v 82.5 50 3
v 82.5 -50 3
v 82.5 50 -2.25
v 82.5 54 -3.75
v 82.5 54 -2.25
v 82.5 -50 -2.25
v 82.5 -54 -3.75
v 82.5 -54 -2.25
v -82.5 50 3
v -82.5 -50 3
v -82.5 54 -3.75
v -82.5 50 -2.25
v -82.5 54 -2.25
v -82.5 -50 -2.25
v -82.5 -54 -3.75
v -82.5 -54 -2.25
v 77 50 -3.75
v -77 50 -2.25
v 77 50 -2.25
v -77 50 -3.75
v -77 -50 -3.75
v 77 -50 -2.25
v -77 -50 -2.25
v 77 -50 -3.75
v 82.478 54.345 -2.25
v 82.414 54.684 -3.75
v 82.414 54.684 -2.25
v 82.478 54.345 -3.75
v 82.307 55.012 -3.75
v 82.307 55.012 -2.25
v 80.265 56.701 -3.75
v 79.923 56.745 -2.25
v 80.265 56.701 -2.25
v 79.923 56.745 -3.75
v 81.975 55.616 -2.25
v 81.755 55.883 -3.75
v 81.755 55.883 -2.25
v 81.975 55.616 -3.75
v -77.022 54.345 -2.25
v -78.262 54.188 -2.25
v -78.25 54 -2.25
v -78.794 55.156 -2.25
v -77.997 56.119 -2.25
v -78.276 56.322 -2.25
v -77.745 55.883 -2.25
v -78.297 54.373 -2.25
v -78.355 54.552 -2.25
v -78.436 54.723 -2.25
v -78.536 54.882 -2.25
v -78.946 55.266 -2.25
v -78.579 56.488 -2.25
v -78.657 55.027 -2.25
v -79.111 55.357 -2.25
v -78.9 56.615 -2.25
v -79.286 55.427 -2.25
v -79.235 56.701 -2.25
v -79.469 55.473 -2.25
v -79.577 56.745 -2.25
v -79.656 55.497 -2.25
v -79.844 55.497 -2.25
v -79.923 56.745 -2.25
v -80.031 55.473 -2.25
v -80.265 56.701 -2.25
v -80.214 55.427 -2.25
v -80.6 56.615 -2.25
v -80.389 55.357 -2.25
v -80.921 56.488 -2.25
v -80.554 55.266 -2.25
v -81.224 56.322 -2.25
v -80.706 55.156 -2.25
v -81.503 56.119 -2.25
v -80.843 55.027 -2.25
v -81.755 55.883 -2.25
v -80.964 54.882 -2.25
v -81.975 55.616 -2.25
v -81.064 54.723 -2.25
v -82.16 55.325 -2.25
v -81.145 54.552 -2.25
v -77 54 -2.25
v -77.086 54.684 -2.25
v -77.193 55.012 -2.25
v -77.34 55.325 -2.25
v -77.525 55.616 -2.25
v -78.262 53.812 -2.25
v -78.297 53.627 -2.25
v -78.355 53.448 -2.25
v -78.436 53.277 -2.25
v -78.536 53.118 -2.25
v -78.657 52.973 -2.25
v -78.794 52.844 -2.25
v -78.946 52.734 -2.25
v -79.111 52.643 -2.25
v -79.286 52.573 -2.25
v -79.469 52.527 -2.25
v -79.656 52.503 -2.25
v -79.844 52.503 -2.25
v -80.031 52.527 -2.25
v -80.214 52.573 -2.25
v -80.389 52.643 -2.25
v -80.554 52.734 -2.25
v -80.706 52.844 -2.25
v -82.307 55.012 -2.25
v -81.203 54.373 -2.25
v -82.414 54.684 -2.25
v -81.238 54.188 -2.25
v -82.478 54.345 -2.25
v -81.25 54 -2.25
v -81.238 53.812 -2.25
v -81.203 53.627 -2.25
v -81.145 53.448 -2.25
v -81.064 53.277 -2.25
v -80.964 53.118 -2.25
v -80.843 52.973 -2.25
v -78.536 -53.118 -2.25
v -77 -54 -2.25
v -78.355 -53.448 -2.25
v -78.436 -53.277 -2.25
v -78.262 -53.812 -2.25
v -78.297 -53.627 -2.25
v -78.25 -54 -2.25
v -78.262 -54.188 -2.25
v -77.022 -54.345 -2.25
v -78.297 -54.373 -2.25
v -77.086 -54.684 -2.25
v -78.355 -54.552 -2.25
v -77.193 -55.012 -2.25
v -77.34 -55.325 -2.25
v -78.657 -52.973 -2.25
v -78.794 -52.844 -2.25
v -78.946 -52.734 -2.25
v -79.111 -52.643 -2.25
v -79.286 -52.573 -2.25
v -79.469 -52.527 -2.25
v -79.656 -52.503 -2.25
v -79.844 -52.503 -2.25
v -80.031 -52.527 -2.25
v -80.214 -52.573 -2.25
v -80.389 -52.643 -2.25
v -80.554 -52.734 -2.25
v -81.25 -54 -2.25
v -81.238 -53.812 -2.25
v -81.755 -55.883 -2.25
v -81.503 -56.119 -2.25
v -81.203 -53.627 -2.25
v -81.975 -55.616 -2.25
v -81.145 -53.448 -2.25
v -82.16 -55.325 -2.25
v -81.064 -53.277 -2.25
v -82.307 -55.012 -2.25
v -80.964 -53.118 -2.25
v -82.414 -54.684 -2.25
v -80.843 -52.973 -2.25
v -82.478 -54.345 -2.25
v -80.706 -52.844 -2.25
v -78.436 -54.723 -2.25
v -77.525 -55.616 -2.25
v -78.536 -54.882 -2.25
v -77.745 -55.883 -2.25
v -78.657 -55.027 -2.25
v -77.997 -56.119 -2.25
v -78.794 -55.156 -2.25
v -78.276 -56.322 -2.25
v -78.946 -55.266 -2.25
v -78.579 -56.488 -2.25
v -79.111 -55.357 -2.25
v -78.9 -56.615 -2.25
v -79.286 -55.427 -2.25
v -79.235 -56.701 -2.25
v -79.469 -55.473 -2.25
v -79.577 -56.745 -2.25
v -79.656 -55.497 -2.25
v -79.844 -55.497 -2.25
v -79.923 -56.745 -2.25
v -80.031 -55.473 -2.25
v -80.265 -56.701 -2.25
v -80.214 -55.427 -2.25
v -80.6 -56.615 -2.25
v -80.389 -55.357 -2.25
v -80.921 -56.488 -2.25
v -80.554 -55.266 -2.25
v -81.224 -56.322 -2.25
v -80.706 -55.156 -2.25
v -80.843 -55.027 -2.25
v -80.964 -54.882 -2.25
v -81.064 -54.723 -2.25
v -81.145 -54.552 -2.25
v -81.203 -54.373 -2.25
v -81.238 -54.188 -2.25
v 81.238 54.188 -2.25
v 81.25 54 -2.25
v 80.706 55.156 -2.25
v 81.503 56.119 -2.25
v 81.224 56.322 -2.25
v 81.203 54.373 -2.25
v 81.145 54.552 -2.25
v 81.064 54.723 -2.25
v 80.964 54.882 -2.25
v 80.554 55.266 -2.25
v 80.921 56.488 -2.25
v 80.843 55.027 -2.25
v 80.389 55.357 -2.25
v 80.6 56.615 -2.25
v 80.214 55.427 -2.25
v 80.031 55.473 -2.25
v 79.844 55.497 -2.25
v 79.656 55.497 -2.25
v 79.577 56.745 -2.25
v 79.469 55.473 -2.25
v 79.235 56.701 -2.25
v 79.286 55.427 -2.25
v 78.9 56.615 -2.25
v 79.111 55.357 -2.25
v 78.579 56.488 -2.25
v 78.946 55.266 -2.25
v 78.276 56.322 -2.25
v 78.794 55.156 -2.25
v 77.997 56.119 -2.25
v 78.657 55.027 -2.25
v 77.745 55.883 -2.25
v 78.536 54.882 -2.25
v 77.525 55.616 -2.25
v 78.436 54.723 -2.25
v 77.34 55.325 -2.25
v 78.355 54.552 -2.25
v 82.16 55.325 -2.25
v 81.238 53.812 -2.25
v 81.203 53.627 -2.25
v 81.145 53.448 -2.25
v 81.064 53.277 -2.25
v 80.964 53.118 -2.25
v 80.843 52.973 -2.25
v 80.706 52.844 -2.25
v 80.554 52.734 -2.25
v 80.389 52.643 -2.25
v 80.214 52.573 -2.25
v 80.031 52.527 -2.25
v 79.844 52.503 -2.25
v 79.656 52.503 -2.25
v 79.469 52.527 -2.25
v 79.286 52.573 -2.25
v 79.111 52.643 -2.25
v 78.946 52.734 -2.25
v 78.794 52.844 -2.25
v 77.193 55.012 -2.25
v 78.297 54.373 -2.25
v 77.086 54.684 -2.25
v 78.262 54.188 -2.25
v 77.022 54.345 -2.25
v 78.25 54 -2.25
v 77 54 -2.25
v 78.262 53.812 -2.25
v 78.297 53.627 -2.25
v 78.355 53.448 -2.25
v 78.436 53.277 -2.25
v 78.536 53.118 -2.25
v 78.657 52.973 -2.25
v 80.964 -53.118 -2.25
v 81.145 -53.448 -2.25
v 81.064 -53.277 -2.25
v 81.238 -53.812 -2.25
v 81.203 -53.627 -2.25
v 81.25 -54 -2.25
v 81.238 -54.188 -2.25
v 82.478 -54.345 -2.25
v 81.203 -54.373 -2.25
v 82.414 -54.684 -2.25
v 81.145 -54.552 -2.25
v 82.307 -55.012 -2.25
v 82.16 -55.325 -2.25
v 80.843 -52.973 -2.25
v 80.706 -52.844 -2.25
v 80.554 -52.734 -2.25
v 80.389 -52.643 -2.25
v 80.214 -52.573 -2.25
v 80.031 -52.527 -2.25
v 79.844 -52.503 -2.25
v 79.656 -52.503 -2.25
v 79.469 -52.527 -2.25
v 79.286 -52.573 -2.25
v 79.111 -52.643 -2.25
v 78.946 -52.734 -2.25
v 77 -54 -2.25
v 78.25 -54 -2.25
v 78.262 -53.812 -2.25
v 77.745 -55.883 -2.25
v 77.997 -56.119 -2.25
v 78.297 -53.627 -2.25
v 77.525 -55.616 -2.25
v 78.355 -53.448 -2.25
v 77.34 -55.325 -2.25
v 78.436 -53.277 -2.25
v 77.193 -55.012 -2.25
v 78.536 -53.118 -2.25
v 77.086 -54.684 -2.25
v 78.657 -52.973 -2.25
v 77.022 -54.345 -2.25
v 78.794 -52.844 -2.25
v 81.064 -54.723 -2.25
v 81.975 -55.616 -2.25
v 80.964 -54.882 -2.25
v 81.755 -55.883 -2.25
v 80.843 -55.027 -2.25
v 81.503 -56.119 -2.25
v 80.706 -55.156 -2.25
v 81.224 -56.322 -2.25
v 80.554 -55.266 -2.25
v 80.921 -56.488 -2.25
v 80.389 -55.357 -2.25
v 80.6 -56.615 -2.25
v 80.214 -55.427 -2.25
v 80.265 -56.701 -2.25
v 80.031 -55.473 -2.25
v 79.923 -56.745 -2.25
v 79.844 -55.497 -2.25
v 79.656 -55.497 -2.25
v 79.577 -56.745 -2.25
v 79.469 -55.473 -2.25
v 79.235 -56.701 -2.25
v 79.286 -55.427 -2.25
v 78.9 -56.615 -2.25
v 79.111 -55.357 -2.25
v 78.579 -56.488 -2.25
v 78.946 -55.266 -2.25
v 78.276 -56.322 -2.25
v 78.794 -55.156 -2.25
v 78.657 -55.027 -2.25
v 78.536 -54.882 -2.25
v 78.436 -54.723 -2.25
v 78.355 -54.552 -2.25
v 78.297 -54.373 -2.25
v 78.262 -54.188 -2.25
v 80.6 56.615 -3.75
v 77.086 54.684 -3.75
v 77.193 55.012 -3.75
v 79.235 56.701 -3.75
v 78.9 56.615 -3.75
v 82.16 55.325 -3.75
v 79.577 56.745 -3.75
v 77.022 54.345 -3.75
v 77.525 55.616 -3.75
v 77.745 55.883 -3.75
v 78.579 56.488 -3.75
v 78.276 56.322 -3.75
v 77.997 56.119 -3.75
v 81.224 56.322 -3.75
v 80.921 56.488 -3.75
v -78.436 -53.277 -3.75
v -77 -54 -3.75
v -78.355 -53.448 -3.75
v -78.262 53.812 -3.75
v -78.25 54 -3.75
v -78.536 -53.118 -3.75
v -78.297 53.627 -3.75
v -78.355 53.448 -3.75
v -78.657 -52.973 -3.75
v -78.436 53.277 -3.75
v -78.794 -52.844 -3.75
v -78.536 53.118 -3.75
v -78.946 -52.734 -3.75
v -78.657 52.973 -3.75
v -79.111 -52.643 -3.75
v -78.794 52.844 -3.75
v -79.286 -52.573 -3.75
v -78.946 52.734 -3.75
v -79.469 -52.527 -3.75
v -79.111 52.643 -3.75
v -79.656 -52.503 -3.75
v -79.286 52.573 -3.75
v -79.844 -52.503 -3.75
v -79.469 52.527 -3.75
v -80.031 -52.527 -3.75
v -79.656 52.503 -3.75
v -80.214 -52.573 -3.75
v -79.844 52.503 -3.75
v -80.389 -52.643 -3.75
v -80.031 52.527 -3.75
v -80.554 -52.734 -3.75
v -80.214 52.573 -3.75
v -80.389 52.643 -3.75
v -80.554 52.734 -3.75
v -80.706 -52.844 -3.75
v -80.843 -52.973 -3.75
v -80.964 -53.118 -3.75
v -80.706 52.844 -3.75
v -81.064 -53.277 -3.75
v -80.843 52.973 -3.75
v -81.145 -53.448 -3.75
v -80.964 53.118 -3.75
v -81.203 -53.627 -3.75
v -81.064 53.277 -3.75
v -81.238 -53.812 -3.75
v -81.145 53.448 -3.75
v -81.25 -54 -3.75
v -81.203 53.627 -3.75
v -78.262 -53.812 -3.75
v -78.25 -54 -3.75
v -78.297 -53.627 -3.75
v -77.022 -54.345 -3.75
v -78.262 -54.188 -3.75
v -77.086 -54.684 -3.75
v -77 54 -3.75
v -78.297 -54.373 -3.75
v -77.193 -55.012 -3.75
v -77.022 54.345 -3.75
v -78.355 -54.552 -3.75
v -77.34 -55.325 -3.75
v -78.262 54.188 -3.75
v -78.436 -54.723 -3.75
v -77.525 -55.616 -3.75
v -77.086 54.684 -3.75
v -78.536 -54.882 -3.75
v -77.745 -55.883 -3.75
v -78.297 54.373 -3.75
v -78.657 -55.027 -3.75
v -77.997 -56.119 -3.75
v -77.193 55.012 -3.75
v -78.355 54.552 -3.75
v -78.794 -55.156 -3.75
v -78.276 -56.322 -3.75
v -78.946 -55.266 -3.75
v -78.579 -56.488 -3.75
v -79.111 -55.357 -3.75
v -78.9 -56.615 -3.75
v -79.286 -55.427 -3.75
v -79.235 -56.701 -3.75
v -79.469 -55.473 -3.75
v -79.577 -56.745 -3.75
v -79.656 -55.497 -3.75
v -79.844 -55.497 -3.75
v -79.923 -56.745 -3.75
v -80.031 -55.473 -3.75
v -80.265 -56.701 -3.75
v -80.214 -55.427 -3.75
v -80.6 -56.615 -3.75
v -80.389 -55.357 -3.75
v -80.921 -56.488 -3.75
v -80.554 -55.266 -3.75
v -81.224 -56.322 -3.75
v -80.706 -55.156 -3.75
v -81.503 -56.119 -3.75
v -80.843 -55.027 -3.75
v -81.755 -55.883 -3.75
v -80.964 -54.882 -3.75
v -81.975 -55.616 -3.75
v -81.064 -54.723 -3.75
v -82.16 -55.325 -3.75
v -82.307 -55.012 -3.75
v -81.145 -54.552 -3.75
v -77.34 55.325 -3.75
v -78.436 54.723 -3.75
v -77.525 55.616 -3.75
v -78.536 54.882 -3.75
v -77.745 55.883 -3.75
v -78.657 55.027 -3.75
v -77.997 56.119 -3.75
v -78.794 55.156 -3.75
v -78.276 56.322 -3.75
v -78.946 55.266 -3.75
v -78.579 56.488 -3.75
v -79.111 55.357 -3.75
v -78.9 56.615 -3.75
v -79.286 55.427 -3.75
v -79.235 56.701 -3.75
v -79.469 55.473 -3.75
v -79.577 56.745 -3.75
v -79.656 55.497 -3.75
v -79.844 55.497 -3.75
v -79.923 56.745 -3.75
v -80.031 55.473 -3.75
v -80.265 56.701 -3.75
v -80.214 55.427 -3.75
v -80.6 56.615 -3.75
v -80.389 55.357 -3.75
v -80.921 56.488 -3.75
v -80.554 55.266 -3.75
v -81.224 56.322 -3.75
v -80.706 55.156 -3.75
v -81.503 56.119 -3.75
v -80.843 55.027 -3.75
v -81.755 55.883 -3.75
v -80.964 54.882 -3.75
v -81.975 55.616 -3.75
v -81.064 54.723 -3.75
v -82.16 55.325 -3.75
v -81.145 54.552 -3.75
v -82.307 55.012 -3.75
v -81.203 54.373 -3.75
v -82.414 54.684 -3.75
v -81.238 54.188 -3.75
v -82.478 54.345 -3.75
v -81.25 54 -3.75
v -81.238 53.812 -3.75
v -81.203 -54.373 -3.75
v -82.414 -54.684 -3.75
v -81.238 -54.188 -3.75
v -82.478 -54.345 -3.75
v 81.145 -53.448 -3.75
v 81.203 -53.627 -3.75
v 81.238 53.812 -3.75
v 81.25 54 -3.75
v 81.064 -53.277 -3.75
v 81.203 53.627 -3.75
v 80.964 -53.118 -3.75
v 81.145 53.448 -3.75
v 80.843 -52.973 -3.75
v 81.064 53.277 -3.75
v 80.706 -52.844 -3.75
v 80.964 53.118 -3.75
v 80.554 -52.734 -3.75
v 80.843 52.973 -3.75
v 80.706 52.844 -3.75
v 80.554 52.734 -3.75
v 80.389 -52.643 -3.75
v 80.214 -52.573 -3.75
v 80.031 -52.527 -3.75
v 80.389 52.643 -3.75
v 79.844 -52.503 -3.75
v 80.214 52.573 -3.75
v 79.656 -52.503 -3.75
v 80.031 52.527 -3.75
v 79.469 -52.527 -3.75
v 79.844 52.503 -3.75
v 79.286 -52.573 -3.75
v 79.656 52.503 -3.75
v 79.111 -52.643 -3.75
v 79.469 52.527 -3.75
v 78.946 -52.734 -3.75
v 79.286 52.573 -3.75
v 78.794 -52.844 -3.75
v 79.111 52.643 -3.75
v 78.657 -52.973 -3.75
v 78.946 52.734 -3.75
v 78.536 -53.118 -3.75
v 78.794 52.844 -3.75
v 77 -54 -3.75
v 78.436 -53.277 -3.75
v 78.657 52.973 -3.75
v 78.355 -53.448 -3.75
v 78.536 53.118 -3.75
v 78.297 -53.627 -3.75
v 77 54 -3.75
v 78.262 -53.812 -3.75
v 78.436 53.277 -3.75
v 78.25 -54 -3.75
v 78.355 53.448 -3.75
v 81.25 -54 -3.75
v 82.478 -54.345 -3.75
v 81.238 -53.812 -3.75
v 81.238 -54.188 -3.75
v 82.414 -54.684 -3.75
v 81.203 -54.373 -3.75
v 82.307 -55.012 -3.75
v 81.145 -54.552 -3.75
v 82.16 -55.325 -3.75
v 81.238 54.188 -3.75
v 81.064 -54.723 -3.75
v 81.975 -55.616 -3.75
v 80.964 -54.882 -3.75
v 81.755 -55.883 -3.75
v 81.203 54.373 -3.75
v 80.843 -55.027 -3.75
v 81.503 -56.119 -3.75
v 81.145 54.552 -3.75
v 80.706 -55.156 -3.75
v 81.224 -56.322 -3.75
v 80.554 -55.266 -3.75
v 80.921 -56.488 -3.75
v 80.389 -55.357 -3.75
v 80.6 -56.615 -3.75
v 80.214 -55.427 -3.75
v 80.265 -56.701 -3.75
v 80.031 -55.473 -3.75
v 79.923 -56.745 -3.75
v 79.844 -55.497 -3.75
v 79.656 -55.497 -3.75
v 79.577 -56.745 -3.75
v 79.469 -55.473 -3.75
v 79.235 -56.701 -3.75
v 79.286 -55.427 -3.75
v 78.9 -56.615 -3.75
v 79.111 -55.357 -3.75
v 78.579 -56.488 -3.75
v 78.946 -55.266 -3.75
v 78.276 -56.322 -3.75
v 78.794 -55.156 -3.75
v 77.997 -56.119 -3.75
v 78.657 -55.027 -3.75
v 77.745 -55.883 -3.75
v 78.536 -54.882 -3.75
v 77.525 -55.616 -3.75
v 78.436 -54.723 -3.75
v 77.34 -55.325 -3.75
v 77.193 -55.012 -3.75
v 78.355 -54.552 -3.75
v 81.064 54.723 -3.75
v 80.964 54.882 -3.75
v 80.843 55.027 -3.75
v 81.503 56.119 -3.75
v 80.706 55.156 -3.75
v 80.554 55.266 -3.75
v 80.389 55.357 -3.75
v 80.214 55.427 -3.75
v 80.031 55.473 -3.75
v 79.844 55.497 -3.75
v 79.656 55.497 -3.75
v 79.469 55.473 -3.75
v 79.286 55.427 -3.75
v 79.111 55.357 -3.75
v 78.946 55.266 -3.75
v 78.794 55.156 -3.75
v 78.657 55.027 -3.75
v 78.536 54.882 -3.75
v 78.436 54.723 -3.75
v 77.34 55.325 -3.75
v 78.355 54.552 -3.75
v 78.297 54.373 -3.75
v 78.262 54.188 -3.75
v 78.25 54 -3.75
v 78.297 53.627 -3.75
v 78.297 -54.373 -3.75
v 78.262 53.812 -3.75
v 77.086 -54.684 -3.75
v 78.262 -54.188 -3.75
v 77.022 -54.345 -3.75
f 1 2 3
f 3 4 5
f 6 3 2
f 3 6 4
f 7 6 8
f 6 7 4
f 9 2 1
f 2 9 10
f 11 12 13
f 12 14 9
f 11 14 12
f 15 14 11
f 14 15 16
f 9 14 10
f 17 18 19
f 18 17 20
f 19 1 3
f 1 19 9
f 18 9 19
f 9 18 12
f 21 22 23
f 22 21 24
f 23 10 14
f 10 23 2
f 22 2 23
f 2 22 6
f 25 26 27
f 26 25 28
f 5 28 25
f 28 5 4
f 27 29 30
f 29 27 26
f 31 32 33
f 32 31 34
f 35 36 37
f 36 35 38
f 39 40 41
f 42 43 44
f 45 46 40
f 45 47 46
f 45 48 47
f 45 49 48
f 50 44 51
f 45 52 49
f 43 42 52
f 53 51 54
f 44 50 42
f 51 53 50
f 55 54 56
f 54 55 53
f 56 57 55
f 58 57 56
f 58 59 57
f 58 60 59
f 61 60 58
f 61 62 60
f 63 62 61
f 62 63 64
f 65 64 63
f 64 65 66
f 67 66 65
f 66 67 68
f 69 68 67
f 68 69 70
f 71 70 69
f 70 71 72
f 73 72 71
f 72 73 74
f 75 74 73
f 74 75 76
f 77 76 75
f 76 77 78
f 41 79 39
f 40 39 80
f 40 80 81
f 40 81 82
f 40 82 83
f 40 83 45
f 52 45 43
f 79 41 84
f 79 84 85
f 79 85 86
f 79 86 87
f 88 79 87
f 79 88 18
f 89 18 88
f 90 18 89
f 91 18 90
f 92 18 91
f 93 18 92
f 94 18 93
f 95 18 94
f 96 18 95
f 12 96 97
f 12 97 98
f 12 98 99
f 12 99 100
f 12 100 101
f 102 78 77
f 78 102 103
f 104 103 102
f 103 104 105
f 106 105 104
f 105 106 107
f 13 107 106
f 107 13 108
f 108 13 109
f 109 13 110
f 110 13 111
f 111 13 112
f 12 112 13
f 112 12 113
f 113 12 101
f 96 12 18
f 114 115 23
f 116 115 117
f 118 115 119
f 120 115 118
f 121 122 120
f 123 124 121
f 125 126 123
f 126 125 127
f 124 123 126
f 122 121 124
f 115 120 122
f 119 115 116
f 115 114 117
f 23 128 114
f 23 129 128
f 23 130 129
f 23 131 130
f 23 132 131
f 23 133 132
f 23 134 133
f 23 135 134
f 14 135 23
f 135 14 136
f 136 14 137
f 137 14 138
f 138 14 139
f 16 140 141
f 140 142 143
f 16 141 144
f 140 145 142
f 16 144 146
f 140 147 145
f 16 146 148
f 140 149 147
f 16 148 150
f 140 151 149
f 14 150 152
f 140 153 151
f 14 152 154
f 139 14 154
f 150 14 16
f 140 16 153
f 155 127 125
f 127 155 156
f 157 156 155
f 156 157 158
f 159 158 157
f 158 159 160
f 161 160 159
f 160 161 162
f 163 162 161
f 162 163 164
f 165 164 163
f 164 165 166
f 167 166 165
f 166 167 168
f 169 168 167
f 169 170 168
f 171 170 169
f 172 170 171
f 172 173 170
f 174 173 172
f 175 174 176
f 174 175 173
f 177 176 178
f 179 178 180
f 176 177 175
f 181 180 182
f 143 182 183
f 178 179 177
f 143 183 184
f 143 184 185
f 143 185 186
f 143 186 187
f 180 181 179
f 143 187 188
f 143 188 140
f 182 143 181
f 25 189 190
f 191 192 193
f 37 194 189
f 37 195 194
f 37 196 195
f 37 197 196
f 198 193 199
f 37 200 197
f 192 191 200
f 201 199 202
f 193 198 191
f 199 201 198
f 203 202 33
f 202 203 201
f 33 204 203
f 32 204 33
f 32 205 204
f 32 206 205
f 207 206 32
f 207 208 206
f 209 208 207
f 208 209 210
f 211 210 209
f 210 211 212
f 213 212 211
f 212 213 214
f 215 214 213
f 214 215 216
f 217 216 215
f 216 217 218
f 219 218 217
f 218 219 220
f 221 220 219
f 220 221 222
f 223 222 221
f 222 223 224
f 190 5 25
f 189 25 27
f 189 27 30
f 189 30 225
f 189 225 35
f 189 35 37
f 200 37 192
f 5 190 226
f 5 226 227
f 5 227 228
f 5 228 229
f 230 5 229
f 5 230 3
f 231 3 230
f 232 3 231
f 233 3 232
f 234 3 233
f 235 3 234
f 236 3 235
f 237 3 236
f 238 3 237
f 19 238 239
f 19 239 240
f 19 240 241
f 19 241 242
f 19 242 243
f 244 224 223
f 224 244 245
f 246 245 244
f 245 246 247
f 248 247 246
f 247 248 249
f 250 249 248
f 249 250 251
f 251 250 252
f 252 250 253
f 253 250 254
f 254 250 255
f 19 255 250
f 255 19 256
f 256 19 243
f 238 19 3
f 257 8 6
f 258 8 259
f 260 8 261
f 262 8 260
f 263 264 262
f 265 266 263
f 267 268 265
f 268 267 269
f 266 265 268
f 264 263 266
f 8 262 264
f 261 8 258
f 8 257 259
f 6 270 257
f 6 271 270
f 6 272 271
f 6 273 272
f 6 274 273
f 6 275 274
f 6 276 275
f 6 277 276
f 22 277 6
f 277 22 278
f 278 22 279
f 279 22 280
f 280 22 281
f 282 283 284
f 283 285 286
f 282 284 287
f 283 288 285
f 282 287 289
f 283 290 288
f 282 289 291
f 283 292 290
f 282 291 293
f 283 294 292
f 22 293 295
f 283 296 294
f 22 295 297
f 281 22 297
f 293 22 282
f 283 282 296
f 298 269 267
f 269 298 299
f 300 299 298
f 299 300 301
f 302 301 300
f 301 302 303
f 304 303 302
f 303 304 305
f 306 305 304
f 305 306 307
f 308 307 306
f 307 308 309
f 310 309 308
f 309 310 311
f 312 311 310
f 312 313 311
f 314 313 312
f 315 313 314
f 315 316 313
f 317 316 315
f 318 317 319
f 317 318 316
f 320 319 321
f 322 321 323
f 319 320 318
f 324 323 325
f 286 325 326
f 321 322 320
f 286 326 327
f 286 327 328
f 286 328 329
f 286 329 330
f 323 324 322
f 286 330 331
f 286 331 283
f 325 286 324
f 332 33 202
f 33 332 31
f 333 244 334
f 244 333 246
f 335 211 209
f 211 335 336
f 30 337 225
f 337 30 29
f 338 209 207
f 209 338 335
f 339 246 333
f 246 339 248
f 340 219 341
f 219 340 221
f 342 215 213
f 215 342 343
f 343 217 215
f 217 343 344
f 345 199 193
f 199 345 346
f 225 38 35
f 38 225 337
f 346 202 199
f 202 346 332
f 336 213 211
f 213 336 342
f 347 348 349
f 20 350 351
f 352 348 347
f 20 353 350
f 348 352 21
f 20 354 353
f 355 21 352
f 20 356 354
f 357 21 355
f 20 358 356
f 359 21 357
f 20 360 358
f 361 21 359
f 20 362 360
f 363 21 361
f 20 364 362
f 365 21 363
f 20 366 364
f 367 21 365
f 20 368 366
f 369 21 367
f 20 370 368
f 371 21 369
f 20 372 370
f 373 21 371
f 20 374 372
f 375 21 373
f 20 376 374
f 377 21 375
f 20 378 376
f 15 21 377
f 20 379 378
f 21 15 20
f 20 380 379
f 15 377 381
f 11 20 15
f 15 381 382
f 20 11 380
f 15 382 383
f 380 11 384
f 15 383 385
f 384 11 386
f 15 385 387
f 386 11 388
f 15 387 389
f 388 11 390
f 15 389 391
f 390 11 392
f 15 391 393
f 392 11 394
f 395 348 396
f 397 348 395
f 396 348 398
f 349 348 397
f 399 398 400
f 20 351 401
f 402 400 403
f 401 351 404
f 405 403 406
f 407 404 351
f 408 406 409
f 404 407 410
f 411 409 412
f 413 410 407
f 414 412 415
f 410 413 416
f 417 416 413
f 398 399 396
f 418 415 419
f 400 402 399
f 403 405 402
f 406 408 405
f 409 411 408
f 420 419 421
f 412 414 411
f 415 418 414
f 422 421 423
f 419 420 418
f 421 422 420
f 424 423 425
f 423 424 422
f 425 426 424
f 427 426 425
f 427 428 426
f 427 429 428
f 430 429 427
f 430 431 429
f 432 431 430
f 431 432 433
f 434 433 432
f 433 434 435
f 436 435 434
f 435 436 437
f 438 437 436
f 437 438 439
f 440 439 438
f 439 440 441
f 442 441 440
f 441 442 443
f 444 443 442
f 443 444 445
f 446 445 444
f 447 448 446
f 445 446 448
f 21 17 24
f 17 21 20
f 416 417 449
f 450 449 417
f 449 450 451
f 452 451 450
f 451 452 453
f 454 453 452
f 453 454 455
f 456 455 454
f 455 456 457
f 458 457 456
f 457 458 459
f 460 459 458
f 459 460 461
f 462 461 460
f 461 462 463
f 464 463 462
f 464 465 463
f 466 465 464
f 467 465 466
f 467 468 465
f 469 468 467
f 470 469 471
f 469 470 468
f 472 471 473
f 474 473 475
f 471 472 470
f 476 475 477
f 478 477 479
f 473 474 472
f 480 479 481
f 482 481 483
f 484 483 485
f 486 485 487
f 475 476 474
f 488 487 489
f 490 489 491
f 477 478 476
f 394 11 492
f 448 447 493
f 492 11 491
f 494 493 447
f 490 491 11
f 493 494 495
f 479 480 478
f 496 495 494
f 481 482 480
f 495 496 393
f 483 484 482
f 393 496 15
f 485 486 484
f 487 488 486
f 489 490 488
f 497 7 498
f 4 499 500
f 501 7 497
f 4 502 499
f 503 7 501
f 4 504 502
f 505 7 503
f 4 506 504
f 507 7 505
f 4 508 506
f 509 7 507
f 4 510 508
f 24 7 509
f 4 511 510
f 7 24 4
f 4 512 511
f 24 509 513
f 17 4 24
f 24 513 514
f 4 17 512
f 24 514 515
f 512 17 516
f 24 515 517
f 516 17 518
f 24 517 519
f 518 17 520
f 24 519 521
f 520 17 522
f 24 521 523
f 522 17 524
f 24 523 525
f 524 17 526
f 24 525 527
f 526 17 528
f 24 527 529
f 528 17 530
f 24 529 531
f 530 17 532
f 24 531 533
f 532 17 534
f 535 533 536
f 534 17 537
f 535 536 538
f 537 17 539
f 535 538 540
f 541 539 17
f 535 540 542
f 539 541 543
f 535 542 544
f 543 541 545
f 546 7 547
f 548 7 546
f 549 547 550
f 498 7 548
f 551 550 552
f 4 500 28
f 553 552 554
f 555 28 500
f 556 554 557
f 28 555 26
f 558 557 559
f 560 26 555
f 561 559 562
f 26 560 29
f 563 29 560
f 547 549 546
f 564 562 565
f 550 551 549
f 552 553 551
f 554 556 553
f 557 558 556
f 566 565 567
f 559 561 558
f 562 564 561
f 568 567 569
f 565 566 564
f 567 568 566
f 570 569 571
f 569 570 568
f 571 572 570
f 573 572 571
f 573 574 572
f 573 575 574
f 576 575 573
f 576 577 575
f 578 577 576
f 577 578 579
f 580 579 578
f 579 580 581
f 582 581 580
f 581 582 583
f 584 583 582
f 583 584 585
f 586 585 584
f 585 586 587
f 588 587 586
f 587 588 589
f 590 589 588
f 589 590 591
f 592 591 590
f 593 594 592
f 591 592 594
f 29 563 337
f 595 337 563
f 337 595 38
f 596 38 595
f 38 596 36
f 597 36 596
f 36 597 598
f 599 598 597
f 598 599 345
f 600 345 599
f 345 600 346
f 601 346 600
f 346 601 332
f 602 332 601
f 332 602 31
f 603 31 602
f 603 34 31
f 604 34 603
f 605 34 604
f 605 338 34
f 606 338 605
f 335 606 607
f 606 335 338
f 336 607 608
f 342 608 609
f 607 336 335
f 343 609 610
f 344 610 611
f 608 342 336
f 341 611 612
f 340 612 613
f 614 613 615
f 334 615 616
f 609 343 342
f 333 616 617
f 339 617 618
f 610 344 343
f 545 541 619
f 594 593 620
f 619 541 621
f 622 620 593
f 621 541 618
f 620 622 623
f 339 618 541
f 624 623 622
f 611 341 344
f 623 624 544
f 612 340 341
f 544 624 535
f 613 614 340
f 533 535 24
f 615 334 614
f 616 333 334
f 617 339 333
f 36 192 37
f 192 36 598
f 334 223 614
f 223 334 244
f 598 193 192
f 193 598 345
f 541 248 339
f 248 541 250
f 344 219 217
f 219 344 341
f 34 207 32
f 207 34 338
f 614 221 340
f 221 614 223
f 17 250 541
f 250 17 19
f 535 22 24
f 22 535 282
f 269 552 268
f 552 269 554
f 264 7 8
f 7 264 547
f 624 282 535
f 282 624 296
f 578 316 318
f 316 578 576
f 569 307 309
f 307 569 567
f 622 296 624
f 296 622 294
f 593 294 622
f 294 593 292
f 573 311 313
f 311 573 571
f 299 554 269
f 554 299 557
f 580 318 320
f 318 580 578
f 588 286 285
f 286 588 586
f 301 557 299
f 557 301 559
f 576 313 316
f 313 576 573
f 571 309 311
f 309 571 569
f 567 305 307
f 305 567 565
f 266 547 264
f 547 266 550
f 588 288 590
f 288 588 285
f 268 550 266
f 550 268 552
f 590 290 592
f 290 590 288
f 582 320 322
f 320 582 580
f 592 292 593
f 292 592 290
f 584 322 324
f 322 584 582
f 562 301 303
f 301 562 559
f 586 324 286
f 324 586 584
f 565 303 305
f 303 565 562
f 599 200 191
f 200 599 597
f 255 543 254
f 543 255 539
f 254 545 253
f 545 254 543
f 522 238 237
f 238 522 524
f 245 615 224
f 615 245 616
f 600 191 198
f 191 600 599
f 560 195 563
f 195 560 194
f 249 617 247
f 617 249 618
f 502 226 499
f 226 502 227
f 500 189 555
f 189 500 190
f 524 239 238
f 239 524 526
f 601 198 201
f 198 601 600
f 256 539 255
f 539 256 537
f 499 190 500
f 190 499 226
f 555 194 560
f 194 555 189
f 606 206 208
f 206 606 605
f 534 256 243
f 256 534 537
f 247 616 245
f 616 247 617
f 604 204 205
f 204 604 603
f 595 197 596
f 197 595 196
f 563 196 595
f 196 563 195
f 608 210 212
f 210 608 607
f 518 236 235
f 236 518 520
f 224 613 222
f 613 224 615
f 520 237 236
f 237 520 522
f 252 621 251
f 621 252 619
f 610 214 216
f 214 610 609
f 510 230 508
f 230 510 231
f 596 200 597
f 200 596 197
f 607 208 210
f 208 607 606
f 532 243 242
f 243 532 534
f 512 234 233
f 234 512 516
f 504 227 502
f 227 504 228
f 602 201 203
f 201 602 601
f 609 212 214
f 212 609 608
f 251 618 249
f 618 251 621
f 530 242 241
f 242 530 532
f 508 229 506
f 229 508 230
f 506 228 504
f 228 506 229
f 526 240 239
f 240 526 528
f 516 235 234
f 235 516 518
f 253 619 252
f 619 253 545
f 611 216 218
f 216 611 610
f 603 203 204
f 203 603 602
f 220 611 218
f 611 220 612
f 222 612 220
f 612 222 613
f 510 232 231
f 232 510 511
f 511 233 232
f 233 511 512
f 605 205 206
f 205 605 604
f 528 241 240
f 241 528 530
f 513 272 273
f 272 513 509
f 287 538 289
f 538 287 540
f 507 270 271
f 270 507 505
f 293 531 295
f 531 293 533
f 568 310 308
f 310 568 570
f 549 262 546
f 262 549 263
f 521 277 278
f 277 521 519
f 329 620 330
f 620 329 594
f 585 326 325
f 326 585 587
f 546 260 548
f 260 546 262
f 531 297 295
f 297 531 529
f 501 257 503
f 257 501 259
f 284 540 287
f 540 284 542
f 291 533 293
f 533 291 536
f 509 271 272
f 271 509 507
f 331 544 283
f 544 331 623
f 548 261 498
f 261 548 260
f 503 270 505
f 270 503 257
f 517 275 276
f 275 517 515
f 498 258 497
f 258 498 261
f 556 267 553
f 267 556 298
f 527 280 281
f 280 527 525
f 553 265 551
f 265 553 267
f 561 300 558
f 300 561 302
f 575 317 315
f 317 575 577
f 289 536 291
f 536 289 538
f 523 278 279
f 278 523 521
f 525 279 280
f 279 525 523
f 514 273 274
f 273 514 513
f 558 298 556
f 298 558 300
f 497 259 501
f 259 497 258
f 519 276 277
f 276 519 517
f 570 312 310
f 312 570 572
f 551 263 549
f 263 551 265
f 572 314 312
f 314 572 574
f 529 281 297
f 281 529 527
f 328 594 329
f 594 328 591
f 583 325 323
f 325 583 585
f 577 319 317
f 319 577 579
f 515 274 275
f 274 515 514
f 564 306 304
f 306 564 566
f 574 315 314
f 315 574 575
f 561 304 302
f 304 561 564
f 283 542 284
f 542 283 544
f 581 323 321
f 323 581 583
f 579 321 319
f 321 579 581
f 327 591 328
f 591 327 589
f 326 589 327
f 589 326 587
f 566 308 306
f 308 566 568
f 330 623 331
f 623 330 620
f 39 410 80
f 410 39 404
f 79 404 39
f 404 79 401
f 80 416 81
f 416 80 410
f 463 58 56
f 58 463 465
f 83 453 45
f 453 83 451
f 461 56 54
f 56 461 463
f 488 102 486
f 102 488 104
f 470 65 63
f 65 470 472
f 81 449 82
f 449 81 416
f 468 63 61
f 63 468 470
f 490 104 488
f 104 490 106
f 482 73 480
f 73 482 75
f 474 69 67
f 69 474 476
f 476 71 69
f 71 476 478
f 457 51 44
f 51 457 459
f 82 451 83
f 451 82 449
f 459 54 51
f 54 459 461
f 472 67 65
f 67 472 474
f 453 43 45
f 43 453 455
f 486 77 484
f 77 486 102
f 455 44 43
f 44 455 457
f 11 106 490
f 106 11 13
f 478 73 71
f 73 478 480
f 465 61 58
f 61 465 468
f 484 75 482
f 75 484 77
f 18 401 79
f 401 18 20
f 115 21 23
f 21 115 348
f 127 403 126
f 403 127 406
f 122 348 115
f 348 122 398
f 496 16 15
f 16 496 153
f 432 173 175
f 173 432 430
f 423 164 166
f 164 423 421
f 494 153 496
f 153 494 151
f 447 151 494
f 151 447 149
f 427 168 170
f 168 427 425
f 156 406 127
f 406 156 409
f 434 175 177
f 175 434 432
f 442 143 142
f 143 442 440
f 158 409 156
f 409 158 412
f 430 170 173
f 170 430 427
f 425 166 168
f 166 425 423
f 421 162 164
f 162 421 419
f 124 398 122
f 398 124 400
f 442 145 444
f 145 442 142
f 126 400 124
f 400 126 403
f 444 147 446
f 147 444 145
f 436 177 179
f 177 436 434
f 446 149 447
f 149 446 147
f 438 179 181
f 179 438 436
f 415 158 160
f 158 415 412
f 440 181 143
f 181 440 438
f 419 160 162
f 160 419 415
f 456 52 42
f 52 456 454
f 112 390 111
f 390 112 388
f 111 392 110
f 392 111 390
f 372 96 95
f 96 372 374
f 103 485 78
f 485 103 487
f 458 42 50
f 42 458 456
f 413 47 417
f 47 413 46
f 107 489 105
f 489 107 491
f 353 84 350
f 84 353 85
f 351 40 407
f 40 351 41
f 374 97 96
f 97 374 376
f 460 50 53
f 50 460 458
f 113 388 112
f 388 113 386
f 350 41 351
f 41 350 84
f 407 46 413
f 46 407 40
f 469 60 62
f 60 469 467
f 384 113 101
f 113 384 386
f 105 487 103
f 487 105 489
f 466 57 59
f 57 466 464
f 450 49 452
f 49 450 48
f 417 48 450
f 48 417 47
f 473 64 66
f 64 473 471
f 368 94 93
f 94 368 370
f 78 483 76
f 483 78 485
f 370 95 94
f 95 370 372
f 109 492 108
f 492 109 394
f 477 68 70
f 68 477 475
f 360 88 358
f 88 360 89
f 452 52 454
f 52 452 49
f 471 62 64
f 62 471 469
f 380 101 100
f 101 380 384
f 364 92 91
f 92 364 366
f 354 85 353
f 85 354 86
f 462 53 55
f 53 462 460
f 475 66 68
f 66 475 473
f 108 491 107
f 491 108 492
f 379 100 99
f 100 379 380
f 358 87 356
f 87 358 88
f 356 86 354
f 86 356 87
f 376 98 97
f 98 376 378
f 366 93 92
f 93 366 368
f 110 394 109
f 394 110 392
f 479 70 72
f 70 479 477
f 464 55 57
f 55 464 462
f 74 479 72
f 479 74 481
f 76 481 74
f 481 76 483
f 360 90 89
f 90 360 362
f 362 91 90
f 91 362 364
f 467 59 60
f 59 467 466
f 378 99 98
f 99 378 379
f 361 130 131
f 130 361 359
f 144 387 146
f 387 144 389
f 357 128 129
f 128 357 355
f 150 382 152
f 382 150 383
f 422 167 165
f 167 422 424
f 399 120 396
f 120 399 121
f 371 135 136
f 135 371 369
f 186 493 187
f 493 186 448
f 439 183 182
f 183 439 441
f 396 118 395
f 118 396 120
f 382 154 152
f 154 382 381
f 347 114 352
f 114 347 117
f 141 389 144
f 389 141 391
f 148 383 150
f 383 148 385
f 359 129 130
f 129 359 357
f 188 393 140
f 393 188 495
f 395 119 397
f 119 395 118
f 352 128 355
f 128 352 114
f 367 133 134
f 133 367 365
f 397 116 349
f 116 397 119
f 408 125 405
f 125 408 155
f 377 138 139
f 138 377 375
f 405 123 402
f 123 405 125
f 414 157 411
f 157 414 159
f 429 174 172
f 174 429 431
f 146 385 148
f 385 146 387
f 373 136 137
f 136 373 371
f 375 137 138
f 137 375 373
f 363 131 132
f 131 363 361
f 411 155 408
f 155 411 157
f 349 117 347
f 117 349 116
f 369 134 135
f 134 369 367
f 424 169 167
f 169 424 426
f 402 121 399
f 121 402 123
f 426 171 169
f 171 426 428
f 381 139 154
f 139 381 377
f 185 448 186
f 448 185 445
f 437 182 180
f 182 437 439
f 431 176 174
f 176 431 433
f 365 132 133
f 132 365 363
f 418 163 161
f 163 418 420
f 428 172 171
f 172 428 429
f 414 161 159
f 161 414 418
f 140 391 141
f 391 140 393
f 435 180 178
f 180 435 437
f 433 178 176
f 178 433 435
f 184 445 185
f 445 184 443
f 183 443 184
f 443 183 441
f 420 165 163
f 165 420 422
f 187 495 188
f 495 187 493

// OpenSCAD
/*
 * UCTronics UC-595, https://www.uctronics.com/display/uctronics-7-inch-touch-screen-for-raspberry-pi-1024-600-capacitive-hdmi-lcd-touchscreen-monitor-portable-display-for-pi-4-b-3-b-windows-10-8-7-free-driver.html
 */
 module uc595() {
   
   // in mm
   screenWidth = 165;
   screenLength = 100;
   screenTickness = 6;
   
   lcdWidth = 155;
   lcdHeight = 86;
   
   plateWidth = 165;
   plateLength = 100;
   plateThickness = 1.5;
   
   sidePlateWidth = 5.5;
   sidePlateFullLength = 115;
   sidePlateBetweenHoleAxis = 108;
   sidePlateHolesDiam = 3;
   
   union() {
     color("black") {
       cube(size=[screenWidth, screenLength, screenTickness], center=true);
     }
     color("gray") {
       cube(size=[lcdWidth, lcdHeight, screenTickness], center=true);
     }
     translate([0, 0, 2.6]) {
       color("cyan") {
         text("UCTRONICS UC-595", halign="center");
       }
     }
   }
   translate([0, 0, -3]) {
     color("green") {
       union() {
         // Side plate 1
         translate([((plateWidth - sidePlateWidth)/ 2), 0, 0]) {
           difference() {
             union() {
               translate([0, (sidePlateBetweenHoleAxis / 2), 0]) {
                 cylinder(h=plateThickness, d=sidePlateWidth, center=true, $fn=50);
               }
               cube(size=[sidePlateWidth, sidePlateBetweenHoleAxis, plateThickness], center=true);
               translate([0, - (sidePlateBetweenHoleAxis / 2), 0]) {
                 cylinder(h=plateThickness, d=sidePlateWidth, center=true, $fn=50);
               }
             }
             translate([0, (sidePlateBetweenHoleAxis / 2), 0]) {
               cylinder(h=2 * plateThickness, d=sidePlateHolesDiam, center=true, $fn=50);
             }
             translate([0, -(sidePlateBetweenHoleAxis / 2), 0]) {
               cylinder(h=2 * plateThickness, d=sidePlateHolesDiam, center=true, $fn=50);
             }
           }
         }
         // Main plate
         cube(size=[plateWidth, plateLength, plateThickness], center=true);
         // Side plate 2
         translate([-((plateWidth - sidePlateWidth)/ 2), 0, 0]) {
           difference() {
             union() {
               translate([0, (sidePlateBetweenHoleAxis / 2), 0]) {
                 cylinder(h=plateThickness, d=sidePlateWidth, center=true, $fn=50);
               }
               cube(size=[sidePlateWidth, sidePlateBetweenHoleAxis, plateThickness], center=true);
               translate([0, - (sidePlateBetweenHoleAxis / 2), 0]) {
                 cylinder(h=plateThickness, d=sidePlateWidth, center=true, $fn=50);
               }
             }
             translate([0, (sidePlateBetweenHoleAxis / 2), 0]) {
               cylinder(h=2 * plateThickness, d=sidePlateHolesDiam, center=true, $fn=50);
             }
             translate([0, -(sidePlateBetweenHoleAxis / 2), 0]) {
               cylinder(h=2 * plateThickness, d=sidePlateHolesDiam, center=true, $fn=50);
             }
           }
         }           
       }
     }
   }
}
 
uc595();
 
